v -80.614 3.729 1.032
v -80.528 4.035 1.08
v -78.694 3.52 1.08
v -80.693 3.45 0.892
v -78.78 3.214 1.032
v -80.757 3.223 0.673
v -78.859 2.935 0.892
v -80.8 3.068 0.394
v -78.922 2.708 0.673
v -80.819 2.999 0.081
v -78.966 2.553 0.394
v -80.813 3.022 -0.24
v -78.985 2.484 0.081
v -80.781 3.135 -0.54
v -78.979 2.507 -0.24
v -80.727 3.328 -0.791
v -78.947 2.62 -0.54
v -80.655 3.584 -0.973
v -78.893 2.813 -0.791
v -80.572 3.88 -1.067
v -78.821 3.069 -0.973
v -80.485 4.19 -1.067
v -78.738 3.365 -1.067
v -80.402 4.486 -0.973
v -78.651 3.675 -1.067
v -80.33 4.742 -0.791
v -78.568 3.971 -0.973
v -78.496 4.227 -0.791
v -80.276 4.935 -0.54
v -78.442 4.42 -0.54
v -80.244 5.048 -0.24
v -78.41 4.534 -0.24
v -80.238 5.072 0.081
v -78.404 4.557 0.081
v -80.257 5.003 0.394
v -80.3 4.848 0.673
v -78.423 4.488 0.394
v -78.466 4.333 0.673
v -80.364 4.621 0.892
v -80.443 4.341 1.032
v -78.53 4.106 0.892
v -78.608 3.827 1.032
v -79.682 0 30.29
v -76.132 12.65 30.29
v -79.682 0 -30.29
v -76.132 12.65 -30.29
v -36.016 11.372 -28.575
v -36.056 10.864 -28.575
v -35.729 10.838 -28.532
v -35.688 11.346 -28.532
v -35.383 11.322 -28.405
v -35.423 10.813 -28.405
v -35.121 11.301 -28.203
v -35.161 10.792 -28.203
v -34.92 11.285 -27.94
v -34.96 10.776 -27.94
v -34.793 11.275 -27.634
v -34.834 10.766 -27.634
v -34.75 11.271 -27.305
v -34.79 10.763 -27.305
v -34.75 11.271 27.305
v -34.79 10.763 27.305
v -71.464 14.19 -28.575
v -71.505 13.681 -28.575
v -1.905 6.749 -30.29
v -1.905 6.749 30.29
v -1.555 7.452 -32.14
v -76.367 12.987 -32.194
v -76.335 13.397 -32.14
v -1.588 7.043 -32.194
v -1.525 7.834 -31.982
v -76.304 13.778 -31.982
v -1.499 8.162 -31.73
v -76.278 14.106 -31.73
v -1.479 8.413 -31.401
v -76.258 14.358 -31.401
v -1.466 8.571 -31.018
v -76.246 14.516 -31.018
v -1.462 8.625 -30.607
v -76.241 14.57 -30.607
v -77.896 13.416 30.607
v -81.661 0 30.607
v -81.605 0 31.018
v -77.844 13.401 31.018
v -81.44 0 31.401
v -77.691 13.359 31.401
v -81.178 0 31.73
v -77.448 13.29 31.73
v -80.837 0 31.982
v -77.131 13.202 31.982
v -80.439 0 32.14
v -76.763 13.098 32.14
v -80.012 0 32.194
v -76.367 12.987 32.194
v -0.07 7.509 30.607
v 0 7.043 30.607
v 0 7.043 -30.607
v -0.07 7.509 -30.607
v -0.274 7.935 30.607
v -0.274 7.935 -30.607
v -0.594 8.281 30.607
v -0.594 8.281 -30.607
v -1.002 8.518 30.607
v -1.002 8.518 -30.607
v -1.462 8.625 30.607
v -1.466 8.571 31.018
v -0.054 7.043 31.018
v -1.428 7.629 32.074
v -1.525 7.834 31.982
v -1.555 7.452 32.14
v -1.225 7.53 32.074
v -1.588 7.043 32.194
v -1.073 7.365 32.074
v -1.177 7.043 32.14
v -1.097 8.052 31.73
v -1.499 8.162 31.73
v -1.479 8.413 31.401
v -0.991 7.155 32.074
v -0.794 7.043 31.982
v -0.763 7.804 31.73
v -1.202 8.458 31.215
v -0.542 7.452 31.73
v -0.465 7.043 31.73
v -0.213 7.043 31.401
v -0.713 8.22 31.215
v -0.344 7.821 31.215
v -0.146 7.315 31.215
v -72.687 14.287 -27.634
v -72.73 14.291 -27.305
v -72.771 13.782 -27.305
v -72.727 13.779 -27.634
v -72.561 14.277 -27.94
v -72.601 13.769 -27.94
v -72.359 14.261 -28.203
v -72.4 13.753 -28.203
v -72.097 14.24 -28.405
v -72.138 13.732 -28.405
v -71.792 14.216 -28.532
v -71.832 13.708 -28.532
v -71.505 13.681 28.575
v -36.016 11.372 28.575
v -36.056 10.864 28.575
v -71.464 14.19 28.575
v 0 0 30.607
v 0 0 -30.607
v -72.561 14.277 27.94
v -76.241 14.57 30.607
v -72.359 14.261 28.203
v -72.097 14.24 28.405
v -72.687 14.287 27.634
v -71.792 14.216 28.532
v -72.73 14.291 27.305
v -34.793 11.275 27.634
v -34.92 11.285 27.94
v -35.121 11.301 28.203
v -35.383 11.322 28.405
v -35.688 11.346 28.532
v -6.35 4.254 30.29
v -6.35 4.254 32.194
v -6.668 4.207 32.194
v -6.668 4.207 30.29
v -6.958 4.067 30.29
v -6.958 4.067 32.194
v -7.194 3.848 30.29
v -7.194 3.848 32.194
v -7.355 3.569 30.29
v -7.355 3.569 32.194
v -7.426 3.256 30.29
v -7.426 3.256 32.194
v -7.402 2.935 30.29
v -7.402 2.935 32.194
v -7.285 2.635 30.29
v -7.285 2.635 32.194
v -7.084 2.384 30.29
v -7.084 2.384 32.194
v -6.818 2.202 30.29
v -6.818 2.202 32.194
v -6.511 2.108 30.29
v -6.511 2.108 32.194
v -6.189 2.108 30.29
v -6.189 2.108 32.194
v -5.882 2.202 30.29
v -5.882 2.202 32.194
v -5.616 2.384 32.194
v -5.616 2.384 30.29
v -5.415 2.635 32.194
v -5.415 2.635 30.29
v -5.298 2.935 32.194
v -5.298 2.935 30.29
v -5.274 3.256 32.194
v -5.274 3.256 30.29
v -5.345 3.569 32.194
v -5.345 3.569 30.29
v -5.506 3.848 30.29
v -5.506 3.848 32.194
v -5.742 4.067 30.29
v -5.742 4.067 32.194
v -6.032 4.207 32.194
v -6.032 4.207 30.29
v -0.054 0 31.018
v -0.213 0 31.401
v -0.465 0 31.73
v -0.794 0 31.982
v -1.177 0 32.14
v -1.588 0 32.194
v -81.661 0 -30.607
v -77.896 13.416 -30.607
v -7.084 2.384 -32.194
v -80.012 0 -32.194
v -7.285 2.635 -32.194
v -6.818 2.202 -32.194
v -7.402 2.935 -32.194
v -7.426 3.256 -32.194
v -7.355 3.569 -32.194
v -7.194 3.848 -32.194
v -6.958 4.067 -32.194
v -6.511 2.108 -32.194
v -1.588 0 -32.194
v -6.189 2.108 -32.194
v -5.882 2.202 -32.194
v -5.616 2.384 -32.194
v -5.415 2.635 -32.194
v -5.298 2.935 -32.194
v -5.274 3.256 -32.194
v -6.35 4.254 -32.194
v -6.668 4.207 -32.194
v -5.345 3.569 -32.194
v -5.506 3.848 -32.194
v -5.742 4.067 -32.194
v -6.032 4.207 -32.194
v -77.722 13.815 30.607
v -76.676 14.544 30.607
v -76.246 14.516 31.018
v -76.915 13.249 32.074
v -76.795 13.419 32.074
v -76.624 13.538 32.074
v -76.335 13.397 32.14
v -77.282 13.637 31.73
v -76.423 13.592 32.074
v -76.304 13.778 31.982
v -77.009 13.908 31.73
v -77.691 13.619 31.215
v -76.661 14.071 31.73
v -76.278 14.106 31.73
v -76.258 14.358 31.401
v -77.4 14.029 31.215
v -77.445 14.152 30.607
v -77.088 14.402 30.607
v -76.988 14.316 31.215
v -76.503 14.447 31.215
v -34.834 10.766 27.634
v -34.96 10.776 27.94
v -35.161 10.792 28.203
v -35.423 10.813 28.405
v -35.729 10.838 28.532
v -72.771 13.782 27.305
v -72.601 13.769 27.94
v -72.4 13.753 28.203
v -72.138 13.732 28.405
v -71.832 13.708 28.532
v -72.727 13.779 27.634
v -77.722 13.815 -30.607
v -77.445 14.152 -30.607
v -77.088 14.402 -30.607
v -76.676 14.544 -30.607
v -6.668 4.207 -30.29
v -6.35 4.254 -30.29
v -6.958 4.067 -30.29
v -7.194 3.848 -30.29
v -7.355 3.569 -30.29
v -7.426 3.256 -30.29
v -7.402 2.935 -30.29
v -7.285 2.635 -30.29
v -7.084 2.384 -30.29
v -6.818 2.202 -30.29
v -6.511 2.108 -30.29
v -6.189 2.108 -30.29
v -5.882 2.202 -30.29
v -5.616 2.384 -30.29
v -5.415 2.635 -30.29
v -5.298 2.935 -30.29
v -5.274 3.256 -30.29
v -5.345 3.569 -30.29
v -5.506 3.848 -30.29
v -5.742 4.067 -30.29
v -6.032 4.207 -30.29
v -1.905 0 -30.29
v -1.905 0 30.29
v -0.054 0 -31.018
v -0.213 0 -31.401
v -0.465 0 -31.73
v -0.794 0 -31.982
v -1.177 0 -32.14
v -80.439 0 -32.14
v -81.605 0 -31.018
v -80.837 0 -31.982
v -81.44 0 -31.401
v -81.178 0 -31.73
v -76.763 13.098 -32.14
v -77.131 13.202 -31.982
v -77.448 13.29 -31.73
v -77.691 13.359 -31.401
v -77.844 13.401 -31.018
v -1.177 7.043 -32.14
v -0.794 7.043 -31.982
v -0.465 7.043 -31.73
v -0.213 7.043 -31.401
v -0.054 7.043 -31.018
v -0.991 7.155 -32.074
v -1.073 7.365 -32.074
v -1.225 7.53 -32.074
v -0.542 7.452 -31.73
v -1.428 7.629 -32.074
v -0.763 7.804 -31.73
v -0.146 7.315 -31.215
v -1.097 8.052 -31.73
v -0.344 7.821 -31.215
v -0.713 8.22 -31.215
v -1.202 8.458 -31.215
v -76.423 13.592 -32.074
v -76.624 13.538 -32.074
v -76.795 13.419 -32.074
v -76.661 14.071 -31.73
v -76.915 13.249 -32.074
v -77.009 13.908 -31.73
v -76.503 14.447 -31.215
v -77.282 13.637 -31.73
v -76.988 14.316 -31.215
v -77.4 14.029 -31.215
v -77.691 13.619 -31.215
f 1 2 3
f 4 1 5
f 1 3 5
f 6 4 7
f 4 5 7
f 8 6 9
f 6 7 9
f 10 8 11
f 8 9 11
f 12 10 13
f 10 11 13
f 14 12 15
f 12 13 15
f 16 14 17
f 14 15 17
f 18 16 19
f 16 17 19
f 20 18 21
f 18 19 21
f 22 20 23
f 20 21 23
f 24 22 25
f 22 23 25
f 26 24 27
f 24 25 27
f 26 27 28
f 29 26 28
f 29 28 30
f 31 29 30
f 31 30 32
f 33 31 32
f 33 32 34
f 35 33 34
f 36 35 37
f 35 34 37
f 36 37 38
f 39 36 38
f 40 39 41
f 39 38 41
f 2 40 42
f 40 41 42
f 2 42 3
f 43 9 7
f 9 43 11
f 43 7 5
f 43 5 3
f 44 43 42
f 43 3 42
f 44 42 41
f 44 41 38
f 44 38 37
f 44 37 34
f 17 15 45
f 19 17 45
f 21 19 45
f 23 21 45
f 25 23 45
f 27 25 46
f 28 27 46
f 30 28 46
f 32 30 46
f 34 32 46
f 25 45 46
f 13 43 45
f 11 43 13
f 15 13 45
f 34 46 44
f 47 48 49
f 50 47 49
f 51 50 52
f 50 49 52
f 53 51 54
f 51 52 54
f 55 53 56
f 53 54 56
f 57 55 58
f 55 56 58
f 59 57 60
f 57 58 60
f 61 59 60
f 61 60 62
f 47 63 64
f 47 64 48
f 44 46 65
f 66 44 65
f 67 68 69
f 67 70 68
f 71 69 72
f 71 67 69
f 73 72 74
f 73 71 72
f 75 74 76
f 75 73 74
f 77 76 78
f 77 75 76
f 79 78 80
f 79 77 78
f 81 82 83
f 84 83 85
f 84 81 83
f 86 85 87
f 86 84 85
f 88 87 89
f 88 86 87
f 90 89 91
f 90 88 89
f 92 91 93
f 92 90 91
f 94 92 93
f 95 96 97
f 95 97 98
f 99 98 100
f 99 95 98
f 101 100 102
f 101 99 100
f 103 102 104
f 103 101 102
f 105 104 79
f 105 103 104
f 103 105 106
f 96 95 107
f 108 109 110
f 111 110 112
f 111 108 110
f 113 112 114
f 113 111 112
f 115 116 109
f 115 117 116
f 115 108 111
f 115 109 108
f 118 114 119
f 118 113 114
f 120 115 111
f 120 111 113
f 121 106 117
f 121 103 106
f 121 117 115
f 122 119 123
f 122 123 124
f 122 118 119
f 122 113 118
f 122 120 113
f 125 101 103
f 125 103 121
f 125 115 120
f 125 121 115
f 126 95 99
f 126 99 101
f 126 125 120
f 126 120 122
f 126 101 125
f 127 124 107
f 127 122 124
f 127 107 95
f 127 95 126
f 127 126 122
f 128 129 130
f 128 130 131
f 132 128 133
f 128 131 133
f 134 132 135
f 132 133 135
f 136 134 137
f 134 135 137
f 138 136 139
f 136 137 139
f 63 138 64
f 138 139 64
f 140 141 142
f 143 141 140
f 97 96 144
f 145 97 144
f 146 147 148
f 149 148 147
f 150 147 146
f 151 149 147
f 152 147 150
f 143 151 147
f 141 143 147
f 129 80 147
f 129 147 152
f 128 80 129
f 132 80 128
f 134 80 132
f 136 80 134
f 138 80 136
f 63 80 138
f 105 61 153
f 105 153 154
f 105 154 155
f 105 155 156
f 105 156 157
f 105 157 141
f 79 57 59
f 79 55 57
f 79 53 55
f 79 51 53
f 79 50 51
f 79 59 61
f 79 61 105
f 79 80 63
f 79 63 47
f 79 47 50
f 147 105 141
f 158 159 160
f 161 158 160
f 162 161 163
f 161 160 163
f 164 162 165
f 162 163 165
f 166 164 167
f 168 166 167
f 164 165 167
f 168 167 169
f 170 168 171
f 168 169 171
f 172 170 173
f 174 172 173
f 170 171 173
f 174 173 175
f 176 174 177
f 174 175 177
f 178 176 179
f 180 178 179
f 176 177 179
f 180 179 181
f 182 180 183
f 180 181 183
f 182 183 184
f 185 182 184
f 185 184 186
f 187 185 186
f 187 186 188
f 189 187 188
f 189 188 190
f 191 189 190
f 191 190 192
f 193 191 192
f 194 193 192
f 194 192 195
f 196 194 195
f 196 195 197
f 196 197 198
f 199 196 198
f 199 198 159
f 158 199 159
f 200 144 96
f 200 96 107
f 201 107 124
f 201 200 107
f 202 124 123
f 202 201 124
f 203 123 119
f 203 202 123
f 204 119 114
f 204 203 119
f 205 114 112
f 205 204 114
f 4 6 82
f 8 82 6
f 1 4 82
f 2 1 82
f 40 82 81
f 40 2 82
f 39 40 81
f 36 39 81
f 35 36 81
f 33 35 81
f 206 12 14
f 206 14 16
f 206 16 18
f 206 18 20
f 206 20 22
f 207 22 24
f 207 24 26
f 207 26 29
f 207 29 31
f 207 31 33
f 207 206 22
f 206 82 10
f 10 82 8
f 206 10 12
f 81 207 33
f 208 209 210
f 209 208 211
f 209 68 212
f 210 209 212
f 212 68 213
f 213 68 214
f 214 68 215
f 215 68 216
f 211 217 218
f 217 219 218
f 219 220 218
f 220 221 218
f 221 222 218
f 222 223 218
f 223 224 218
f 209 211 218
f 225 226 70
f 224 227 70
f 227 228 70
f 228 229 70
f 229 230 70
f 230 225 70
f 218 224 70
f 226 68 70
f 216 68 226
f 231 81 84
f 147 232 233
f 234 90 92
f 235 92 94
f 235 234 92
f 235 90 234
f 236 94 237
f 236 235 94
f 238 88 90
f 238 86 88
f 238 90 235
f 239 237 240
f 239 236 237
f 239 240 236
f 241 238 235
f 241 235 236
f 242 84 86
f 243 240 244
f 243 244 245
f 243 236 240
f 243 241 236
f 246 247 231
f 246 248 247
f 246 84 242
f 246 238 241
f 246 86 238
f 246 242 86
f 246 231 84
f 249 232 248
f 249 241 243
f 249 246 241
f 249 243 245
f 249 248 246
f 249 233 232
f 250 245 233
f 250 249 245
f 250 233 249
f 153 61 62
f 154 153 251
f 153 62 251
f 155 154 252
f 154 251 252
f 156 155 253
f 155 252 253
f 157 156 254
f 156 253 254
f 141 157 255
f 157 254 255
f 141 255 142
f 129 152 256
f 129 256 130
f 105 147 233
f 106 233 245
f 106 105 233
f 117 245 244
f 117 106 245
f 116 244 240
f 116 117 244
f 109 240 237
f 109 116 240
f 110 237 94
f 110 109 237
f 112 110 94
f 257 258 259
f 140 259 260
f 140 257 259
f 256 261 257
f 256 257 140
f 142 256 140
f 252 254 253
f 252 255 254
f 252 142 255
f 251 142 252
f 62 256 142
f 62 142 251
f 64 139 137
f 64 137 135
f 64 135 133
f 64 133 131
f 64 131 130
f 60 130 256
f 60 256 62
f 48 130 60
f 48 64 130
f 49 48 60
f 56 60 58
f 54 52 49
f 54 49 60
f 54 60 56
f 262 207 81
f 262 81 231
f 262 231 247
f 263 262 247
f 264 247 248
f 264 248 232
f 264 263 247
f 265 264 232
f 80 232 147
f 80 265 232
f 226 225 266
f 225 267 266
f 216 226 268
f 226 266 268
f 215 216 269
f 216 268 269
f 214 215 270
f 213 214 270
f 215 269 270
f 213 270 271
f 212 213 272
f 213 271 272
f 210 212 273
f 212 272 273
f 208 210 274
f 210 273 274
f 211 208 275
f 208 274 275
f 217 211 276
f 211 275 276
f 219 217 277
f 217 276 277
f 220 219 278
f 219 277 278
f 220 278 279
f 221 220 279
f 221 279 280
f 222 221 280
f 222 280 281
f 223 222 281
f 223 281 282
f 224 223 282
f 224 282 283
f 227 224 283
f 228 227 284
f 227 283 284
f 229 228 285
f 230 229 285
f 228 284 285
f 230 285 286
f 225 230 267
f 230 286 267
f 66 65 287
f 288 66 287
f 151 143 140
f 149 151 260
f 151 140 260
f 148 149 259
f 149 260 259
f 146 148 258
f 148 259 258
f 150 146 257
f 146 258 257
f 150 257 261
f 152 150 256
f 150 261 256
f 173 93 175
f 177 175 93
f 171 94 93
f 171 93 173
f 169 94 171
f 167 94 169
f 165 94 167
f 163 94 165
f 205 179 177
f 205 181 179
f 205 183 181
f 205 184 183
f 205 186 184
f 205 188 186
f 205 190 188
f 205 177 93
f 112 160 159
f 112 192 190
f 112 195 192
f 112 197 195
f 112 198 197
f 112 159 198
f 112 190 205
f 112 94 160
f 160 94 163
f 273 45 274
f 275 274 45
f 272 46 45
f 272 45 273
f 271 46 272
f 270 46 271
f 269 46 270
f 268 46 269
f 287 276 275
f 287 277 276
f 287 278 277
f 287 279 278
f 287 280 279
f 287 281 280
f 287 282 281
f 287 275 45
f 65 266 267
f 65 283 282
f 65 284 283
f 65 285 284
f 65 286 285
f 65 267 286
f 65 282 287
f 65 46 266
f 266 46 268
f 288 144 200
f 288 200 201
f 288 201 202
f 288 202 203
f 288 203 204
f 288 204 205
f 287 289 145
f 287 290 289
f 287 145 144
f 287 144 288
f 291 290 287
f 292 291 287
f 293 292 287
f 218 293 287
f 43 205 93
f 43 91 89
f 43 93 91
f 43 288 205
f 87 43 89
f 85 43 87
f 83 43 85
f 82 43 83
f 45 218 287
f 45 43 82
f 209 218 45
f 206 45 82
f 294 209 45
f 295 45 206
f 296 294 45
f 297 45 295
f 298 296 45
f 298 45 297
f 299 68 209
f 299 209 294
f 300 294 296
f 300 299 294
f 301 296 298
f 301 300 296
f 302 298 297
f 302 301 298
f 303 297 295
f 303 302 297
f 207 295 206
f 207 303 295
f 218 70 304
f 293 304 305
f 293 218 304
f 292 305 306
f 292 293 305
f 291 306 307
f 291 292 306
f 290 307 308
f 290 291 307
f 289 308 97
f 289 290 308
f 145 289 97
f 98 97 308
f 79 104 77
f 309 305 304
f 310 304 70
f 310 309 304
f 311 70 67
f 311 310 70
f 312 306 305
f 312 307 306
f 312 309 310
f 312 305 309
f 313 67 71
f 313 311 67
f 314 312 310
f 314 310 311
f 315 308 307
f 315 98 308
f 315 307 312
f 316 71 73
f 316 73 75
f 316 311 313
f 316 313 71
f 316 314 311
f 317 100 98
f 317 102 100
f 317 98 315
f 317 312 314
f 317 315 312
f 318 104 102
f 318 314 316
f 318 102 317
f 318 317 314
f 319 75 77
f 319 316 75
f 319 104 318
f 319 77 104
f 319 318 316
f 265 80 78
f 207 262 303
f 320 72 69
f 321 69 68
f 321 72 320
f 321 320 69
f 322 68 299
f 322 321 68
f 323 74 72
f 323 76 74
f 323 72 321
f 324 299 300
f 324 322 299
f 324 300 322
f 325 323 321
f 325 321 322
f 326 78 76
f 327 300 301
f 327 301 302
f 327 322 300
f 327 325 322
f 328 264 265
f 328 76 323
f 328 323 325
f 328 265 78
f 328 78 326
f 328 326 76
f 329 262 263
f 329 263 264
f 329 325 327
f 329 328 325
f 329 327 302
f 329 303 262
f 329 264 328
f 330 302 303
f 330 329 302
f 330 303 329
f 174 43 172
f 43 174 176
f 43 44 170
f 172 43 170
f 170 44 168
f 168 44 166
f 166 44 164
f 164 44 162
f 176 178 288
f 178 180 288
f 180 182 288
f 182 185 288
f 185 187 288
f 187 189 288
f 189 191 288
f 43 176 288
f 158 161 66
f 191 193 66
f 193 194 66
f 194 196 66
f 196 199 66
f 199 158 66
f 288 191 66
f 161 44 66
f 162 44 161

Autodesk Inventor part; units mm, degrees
ref_plane "YZ Plane" through (0, 0, 0) normal (1, 0, 0) x (0, 1, 0)
ref_plane "XZ Plane" through (0, 0, 0) normal (0, 1, 0) x (-1, 0, 0)
ref_plane "XY Plane" through (0, 0, 0) normal (0, 0, 1) x (1, 0, 0)
sketch "Sketch1" plane through (0, 0, 0) normal (0, 0, 1) x (1, 0, 0)
  line L0 (0, 0) -> (-81.661, 0)
  line L1 (-81.661, 0) -> (-77.5429, 14.6731)
  line L2 (-77.5429, 14.6731) -> (0, 8.509)
  line L3 (0, 8.509) -> (0, 0)
  dimension "d0" = 81.661
  dimension "d1" = 15.24
  dimension "d2" = 77.7875
  dimension "d3" = 8.509
extrude "Extrusion1" add sketch "Sketch1" along normal mid plane 64.389
fillet "Fillet1" radius 1.5875 8 edges at (-38.7714, 11.591, 32.1945) (0, 8.509, 0) (0, 4.2545, 32.1945) (0, 4.2545, -32.1945) (-38.7714, 11.591, -32.1945) (-77.5429, 14.6731, 0) (-79.6019, 7.3365, -32.1945) (-79.6019, 7.3365, 32.1945)
shell "Shell1" thickness 1.905 removed faces 1 at (-53.8706, 0, 10.7315)
sketch "Sketch3" plane through (-1.4617, 8.6252, 30.607) normal (0.0792423, 0.9968554, 0) x (0.9968554, -0.0792423, 0)
  line L0 (-33.3933, 2.032) -> (-71.4933, 2.032)
  line L1 (-71.4933, 2.032) -> (-71.4933, 59.182)
  line L2 (-71.4933, 59.182) -> (-33.3933, 59.182)
  line L3 (-33.3933, 59.182) -> (-33.3933, 2.032)
  line L4 (-75.0156, 0) -> (-75.0156, 61.214) projected
  line L5 (-76.5733, 61.214) -> (-76.5733, 0) projected
  line L6 (2.1406, 30.607) -> (-92.8395, 30.607)
  point P0 (-71.4933, 30.607)
  dimension "d8" = 57.15
  dimension "d9" = 38.1
  dimension "d11" = 5.08
extrude "Extrusion2" cut sketch "Sketch3" against normal blind 0.508
fillet "Fillet2" radius 1.27 4 edges at (-34.7702, 11.0172, -28.575) (-72.7503, 14.0363, -28.575) (-72.7503, 14.0363, 28.575) (-34.7702, 11.0172, 28.575)
sketch "Sketch4" plane through (-77.8957, 13.4161, -30.607) normal (-0.9627994, 0.2702173, 0) x (0, 0, 1)
  line L0 (61.214, -13.9344) -> (0, -13.9344) projected
  line L1 (30.607, -13.9344) -> (30.607, -2.8384)
  point P0 (30.607, 8.1318)
  point P1 (30.607, -9.7434)
  dimension "d15" = 4.191
hole "Hole1" at (-80.5285, 4.0351, 0) direction (0.9627994, -0.2702173, 0) diameter 2.159 end through all
sketch "Sketch5" plane through (0, 0, -32.1945) normal (0, 0, -1) x (-1, 0, 0)
  line L0 (0, 7.0427) -> (0, 0) projected
  line L1 (1.5875, 0) -> (80.0122, 0) projected
  point P0 (6.35, 3.175)
  dimension "d23" = 6.35
  dimension "d24" = 3.175
hole "Hole2" at (-6.35, 3.175, -32.1945) direction (0, 0, 1) diameter 2.159 end through all
properties part number "Pedal" material "Steel, Cast"
